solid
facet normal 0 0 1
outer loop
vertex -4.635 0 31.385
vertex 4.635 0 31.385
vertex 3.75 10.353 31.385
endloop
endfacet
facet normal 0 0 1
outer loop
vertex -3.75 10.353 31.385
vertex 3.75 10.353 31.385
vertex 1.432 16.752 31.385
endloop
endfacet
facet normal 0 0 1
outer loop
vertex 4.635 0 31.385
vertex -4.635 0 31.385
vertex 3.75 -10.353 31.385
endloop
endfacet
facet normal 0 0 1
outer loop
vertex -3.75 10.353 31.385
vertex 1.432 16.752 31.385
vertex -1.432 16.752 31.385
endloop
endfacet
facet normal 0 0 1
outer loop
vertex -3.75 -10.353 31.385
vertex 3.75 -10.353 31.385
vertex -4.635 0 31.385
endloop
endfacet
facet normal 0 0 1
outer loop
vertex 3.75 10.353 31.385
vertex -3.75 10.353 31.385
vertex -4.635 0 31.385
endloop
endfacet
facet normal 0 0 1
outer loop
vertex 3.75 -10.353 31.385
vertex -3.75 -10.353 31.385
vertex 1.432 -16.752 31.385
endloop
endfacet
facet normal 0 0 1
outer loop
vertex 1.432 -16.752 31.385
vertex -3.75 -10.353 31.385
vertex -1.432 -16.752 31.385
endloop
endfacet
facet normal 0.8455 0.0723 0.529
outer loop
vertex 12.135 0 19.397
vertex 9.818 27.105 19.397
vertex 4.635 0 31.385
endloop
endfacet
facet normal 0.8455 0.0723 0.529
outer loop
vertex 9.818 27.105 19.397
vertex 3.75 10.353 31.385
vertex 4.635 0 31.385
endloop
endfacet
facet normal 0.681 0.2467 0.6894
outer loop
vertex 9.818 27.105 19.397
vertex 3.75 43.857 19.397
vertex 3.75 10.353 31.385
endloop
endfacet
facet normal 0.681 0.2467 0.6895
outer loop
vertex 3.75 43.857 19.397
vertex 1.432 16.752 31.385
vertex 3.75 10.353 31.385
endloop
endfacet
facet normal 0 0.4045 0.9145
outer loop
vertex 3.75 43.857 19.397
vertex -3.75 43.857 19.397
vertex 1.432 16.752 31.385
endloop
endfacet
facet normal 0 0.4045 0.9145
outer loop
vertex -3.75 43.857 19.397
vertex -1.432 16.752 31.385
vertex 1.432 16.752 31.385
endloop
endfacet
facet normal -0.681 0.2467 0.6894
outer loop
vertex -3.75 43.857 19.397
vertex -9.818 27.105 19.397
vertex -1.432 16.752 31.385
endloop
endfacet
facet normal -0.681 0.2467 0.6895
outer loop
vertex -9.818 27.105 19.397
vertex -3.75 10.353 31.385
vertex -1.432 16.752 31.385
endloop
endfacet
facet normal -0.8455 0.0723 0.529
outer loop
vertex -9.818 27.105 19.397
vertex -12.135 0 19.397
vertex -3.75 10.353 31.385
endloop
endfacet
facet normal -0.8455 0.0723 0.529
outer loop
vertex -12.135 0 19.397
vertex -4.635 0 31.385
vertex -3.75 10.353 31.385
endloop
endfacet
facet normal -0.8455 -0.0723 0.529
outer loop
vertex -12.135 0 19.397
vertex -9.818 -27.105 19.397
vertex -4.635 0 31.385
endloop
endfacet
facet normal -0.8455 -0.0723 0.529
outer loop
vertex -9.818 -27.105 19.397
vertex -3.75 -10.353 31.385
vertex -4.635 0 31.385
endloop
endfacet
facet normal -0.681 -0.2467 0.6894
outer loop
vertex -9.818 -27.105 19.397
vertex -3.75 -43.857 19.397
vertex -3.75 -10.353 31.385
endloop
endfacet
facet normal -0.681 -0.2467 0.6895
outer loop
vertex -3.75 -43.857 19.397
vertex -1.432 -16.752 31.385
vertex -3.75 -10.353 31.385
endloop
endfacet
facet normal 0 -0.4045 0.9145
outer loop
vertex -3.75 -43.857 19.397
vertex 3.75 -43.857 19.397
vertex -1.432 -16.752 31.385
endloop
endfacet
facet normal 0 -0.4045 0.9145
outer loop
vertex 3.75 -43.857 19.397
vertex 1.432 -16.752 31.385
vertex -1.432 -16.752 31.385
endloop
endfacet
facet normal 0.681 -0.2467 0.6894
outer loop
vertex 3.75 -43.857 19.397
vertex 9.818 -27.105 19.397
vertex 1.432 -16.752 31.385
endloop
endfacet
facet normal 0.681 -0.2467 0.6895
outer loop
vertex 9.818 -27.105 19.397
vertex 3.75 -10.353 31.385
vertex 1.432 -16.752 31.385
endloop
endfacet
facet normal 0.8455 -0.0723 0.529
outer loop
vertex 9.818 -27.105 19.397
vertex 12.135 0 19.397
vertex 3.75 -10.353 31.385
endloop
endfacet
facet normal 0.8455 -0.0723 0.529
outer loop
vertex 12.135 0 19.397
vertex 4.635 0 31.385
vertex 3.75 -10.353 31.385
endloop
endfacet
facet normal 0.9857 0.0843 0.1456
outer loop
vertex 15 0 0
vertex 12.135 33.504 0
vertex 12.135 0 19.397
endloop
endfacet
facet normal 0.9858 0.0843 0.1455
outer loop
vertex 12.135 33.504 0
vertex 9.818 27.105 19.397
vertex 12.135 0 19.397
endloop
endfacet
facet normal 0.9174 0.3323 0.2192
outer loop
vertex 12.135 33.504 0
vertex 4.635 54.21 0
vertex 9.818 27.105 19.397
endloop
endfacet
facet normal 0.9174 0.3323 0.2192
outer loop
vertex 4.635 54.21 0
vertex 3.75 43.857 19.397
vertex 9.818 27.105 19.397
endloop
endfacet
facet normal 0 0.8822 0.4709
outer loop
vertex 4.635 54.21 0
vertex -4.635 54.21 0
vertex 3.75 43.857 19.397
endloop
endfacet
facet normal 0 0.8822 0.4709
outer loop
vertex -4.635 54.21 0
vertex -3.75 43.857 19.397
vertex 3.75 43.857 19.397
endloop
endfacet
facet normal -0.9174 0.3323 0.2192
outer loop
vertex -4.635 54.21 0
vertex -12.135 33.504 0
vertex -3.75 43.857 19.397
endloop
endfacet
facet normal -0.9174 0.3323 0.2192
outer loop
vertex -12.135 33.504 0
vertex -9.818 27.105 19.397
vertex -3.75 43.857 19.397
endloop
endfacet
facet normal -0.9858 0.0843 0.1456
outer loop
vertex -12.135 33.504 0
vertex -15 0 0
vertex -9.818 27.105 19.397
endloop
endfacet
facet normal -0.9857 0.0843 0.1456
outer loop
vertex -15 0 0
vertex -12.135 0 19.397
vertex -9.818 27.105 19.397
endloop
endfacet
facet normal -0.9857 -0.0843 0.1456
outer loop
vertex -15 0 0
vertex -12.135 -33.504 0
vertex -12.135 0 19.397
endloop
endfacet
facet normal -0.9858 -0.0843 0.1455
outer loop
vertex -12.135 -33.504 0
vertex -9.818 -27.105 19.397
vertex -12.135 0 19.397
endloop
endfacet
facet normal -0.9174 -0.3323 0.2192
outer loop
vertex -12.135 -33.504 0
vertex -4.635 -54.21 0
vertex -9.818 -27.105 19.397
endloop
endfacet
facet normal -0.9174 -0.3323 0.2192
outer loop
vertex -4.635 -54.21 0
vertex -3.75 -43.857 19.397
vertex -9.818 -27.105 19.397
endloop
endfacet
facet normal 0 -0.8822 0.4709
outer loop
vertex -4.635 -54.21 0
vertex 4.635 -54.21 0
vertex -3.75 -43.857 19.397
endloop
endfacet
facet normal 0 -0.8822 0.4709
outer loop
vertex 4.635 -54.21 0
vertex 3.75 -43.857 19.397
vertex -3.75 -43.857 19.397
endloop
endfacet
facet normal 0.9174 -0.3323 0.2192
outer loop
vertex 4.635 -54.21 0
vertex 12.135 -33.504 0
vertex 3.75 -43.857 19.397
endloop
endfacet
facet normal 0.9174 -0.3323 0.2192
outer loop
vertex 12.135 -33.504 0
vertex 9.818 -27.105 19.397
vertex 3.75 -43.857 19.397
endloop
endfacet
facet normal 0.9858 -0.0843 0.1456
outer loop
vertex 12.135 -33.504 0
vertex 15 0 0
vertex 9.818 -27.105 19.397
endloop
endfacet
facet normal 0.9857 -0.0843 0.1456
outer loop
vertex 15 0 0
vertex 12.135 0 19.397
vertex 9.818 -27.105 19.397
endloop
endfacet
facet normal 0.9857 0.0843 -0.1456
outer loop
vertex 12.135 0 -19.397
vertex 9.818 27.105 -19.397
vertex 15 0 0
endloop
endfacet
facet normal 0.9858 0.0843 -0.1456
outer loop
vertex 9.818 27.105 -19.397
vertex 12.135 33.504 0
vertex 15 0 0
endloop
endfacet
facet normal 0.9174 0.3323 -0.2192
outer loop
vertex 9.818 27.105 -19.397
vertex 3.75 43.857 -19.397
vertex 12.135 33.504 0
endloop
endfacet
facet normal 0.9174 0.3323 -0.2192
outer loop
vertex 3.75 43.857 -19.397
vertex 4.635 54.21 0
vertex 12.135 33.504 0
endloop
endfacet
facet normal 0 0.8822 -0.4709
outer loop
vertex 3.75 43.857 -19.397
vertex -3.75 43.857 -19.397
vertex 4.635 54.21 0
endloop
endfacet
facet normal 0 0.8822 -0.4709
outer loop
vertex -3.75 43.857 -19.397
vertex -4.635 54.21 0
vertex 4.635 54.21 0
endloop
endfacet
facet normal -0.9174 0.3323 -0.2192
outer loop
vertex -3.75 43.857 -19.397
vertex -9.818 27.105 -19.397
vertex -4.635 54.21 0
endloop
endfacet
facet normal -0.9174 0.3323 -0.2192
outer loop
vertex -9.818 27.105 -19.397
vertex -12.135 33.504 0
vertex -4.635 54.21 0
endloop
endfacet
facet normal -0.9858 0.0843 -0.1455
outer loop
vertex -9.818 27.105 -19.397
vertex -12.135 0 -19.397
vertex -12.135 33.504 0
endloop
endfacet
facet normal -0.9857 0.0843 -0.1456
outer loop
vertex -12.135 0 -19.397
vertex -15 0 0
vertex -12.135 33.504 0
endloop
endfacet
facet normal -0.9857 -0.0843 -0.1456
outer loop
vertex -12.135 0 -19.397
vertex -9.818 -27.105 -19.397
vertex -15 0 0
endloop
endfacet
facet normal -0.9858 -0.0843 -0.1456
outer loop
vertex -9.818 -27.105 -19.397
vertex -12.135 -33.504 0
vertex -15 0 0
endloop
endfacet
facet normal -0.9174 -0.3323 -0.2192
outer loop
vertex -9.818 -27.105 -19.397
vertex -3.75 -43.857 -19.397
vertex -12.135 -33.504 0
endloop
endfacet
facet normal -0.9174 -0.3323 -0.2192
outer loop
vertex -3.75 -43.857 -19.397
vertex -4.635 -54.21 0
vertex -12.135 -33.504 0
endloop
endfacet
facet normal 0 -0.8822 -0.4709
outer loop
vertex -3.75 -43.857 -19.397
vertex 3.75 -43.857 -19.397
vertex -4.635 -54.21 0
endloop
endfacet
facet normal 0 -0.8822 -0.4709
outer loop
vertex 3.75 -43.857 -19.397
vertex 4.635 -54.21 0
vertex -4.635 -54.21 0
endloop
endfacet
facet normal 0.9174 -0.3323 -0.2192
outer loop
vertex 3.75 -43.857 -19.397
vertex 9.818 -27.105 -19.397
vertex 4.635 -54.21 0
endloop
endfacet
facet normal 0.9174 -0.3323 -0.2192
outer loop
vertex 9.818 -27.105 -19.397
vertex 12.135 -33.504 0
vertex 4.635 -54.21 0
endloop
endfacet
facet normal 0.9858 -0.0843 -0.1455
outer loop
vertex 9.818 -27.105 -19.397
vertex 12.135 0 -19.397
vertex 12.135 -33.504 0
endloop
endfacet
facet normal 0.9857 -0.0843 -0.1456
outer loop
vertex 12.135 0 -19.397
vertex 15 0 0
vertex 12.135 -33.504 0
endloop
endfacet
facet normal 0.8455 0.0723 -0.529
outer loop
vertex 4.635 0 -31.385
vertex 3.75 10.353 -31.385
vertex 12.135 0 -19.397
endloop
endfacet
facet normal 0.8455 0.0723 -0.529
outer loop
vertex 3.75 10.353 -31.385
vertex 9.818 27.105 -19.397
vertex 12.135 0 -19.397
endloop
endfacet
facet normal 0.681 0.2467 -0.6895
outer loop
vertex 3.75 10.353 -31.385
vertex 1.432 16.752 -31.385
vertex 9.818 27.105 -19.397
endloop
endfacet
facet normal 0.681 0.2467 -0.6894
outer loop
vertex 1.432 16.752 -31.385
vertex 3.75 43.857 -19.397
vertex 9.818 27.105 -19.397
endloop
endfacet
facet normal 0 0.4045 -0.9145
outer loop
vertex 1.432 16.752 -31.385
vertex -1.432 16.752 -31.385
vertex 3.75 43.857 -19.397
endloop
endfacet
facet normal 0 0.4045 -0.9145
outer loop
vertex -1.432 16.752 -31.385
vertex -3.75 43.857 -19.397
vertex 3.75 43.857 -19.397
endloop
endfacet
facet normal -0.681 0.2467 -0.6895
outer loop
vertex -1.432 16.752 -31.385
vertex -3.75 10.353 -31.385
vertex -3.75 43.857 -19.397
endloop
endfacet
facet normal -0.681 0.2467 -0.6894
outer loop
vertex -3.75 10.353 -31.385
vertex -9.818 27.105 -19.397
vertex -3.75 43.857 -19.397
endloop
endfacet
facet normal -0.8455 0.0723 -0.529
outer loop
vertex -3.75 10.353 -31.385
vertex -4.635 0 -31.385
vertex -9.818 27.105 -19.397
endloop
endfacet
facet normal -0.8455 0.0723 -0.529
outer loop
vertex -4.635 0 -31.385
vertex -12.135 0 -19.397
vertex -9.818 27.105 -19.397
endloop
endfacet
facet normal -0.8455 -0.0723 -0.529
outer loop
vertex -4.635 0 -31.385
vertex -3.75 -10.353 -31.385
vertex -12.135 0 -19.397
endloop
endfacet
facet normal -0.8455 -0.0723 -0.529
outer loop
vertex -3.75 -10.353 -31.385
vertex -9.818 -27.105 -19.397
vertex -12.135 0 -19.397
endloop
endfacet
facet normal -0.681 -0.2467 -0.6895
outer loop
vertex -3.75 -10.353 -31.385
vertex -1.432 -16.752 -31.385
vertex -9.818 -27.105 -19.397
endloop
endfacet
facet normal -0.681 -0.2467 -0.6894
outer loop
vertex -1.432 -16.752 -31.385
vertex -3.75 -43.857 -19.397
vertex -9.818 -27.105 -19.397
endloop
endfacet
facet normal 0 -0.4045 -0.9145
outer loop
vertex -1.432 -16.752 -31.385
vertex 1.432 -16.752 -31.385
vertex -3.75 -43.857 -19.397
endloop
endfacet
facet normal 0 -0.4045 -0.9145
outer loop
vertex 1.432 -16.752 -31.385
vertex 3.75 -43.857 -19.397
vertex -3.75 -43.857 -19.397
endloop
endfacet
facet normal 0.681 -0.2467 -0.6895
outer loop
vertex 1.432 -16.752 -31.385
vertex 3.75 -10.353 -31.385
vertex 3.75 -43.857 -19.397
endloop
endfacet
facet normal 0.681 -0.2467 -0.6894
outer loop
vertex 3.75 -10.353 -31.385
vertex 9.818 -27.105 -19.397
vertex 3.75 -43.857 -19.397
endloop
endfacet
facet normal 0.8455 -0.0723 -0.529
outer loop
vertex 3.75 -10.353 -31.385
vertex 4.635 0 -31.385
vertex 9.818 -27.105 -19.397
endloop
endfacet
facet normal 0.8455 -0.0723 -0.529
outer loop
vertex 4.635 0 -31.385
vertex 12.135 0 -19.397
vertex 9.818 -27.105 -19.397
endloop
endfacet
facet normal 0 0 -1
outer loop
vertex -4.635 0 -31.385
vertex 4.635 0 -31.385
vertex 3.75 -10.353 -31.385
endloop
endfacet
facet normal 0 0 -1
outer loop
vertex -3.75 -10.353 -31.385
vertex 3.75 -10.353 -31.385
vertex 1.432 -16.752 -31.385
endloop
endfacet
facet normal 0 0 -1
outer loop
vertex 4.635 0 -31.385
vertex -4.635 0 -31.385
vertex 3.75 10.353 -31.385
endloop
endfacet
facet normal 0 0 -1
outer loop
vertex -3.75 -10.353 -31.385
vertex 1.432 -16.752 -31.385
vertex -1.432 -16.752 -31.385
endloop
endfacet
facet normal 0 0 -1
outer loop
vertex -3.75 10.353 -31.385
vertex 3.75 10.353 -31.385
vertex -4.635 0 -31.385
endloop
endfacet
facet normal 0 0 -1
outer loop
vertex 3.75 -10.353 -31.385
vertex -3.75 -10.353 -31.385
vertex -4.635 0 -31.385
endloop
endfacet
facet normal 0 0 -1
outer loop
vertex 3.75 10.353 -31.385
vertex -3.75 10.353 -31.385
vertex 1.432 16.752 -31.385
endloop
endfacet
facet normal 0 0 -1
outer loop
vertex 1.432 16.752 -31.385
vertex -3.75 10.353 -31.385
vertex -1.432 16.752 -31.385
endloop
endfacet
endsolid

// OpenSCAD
// Generated by SolidPython 1.0.1 on 2020-07-29 00:46:47


scale(v = [5, 19, 11]) {
	sphere(r = 3);
}
/***********************************************
*********      SolidPython code:      **********
************************************************
 
# import packages: SolidPython
from solid import *
from solid.utils import *
from itertools import chain, combinations, permutations


class Resize:

    def __init__(self, scad_file):
        self.scad_file = scad_file
        #self.scad_file = import_scad(scad_file)
        # cone/cylinder param:
        self.r1 = 0
        self.r2 = 0
        self.h = 0
        # rectangular prism param:
        self.w = 0
        self.l = 0
        # ellipse param:
        self.r = 0

    # import OpenScad code (file name corresponds to shape)


    # classify shape + parameters
    def assign(self, param1, param2, param3):
        if self.scad_file == 'cone.scad':
            self.r1 = param1
            self.r2 = param2
            self.h = param3
        elif self.scad_file == 'cylinder.scad':
            self.r1 = param1
            self.r2 = param2
            self.h = param3
        elif self.scad_file == 'rectangularPrism.scad':
            self.h = param1
            self.l = param2
            self.w = param3
        else:
            self.r = param1
            self.h = param2

    # resize parameters
    def iterate(self):
        x = range(3, 20, 2)
        i = 1
        if self.scad_file == 'cone.scad':
            tempList = list(permutations(x, 2))
            for temp in tempList:
                param1 = temp[0]
                param2 = temp[1]
                filepath = 'produced_scad_files/' + 'cone' + str(param1) + '_' + str(param2) + '_' + '.scad'
                scad_render_to_file(cylinder(h=param1, r1=param2, r2=0), filepath)

        elif self.scad_file == 'cylinder.scad':
            tempList = list(permutations(x, 3))
            for temp in tempList:
                param1 = temp[0]
                param2 = temp[1]
                filepath = 'produced_scad_files/' + 'cylinder' + str(param1) + '_' + str(param2) + '_' + '.scad'
                scad_render_to_file(cylinder(h=param1, r1=param2, r2=param2), filepath)

        elif self.scad_file == 'rectangularPrism.scad':
            tempList = list(permutations(x, 3))
            for temp in tempList:
                param1 = temp[0]
                param2 = temp[1]
                param3 = temp[2]
                filepath = 'produced_scad_files/' + 'rectangularPrism' + str(param1) + '_' + str(param2) + '_' + str(
                    param3) + '.scad'
                scad_render_to_file(cube(size=(param1, param2, param3)), filepath)

        elif self.scad_file == 'ellipse.scad':
            tempList = list(permutations(x, 4))
            for temp in tempList:
                param1 = temp[0]
                param2 = temp[1]
                param3 = temp[2]
                param4 = temp[3]
                filepath = 'produced_scad_files/' + 'ellipse' + str(param1) + '_' + str(param2) + '_' + str(param3) + '_' + str(param4) + '.scad'
                scad_render_to_file(scale([param1, param2, param3])(sphere(r=param4)), filepath)

    def render_to_scadfile(self):
        scad_render_to_file(scad, 'example.scad') 
 
************************************************/
